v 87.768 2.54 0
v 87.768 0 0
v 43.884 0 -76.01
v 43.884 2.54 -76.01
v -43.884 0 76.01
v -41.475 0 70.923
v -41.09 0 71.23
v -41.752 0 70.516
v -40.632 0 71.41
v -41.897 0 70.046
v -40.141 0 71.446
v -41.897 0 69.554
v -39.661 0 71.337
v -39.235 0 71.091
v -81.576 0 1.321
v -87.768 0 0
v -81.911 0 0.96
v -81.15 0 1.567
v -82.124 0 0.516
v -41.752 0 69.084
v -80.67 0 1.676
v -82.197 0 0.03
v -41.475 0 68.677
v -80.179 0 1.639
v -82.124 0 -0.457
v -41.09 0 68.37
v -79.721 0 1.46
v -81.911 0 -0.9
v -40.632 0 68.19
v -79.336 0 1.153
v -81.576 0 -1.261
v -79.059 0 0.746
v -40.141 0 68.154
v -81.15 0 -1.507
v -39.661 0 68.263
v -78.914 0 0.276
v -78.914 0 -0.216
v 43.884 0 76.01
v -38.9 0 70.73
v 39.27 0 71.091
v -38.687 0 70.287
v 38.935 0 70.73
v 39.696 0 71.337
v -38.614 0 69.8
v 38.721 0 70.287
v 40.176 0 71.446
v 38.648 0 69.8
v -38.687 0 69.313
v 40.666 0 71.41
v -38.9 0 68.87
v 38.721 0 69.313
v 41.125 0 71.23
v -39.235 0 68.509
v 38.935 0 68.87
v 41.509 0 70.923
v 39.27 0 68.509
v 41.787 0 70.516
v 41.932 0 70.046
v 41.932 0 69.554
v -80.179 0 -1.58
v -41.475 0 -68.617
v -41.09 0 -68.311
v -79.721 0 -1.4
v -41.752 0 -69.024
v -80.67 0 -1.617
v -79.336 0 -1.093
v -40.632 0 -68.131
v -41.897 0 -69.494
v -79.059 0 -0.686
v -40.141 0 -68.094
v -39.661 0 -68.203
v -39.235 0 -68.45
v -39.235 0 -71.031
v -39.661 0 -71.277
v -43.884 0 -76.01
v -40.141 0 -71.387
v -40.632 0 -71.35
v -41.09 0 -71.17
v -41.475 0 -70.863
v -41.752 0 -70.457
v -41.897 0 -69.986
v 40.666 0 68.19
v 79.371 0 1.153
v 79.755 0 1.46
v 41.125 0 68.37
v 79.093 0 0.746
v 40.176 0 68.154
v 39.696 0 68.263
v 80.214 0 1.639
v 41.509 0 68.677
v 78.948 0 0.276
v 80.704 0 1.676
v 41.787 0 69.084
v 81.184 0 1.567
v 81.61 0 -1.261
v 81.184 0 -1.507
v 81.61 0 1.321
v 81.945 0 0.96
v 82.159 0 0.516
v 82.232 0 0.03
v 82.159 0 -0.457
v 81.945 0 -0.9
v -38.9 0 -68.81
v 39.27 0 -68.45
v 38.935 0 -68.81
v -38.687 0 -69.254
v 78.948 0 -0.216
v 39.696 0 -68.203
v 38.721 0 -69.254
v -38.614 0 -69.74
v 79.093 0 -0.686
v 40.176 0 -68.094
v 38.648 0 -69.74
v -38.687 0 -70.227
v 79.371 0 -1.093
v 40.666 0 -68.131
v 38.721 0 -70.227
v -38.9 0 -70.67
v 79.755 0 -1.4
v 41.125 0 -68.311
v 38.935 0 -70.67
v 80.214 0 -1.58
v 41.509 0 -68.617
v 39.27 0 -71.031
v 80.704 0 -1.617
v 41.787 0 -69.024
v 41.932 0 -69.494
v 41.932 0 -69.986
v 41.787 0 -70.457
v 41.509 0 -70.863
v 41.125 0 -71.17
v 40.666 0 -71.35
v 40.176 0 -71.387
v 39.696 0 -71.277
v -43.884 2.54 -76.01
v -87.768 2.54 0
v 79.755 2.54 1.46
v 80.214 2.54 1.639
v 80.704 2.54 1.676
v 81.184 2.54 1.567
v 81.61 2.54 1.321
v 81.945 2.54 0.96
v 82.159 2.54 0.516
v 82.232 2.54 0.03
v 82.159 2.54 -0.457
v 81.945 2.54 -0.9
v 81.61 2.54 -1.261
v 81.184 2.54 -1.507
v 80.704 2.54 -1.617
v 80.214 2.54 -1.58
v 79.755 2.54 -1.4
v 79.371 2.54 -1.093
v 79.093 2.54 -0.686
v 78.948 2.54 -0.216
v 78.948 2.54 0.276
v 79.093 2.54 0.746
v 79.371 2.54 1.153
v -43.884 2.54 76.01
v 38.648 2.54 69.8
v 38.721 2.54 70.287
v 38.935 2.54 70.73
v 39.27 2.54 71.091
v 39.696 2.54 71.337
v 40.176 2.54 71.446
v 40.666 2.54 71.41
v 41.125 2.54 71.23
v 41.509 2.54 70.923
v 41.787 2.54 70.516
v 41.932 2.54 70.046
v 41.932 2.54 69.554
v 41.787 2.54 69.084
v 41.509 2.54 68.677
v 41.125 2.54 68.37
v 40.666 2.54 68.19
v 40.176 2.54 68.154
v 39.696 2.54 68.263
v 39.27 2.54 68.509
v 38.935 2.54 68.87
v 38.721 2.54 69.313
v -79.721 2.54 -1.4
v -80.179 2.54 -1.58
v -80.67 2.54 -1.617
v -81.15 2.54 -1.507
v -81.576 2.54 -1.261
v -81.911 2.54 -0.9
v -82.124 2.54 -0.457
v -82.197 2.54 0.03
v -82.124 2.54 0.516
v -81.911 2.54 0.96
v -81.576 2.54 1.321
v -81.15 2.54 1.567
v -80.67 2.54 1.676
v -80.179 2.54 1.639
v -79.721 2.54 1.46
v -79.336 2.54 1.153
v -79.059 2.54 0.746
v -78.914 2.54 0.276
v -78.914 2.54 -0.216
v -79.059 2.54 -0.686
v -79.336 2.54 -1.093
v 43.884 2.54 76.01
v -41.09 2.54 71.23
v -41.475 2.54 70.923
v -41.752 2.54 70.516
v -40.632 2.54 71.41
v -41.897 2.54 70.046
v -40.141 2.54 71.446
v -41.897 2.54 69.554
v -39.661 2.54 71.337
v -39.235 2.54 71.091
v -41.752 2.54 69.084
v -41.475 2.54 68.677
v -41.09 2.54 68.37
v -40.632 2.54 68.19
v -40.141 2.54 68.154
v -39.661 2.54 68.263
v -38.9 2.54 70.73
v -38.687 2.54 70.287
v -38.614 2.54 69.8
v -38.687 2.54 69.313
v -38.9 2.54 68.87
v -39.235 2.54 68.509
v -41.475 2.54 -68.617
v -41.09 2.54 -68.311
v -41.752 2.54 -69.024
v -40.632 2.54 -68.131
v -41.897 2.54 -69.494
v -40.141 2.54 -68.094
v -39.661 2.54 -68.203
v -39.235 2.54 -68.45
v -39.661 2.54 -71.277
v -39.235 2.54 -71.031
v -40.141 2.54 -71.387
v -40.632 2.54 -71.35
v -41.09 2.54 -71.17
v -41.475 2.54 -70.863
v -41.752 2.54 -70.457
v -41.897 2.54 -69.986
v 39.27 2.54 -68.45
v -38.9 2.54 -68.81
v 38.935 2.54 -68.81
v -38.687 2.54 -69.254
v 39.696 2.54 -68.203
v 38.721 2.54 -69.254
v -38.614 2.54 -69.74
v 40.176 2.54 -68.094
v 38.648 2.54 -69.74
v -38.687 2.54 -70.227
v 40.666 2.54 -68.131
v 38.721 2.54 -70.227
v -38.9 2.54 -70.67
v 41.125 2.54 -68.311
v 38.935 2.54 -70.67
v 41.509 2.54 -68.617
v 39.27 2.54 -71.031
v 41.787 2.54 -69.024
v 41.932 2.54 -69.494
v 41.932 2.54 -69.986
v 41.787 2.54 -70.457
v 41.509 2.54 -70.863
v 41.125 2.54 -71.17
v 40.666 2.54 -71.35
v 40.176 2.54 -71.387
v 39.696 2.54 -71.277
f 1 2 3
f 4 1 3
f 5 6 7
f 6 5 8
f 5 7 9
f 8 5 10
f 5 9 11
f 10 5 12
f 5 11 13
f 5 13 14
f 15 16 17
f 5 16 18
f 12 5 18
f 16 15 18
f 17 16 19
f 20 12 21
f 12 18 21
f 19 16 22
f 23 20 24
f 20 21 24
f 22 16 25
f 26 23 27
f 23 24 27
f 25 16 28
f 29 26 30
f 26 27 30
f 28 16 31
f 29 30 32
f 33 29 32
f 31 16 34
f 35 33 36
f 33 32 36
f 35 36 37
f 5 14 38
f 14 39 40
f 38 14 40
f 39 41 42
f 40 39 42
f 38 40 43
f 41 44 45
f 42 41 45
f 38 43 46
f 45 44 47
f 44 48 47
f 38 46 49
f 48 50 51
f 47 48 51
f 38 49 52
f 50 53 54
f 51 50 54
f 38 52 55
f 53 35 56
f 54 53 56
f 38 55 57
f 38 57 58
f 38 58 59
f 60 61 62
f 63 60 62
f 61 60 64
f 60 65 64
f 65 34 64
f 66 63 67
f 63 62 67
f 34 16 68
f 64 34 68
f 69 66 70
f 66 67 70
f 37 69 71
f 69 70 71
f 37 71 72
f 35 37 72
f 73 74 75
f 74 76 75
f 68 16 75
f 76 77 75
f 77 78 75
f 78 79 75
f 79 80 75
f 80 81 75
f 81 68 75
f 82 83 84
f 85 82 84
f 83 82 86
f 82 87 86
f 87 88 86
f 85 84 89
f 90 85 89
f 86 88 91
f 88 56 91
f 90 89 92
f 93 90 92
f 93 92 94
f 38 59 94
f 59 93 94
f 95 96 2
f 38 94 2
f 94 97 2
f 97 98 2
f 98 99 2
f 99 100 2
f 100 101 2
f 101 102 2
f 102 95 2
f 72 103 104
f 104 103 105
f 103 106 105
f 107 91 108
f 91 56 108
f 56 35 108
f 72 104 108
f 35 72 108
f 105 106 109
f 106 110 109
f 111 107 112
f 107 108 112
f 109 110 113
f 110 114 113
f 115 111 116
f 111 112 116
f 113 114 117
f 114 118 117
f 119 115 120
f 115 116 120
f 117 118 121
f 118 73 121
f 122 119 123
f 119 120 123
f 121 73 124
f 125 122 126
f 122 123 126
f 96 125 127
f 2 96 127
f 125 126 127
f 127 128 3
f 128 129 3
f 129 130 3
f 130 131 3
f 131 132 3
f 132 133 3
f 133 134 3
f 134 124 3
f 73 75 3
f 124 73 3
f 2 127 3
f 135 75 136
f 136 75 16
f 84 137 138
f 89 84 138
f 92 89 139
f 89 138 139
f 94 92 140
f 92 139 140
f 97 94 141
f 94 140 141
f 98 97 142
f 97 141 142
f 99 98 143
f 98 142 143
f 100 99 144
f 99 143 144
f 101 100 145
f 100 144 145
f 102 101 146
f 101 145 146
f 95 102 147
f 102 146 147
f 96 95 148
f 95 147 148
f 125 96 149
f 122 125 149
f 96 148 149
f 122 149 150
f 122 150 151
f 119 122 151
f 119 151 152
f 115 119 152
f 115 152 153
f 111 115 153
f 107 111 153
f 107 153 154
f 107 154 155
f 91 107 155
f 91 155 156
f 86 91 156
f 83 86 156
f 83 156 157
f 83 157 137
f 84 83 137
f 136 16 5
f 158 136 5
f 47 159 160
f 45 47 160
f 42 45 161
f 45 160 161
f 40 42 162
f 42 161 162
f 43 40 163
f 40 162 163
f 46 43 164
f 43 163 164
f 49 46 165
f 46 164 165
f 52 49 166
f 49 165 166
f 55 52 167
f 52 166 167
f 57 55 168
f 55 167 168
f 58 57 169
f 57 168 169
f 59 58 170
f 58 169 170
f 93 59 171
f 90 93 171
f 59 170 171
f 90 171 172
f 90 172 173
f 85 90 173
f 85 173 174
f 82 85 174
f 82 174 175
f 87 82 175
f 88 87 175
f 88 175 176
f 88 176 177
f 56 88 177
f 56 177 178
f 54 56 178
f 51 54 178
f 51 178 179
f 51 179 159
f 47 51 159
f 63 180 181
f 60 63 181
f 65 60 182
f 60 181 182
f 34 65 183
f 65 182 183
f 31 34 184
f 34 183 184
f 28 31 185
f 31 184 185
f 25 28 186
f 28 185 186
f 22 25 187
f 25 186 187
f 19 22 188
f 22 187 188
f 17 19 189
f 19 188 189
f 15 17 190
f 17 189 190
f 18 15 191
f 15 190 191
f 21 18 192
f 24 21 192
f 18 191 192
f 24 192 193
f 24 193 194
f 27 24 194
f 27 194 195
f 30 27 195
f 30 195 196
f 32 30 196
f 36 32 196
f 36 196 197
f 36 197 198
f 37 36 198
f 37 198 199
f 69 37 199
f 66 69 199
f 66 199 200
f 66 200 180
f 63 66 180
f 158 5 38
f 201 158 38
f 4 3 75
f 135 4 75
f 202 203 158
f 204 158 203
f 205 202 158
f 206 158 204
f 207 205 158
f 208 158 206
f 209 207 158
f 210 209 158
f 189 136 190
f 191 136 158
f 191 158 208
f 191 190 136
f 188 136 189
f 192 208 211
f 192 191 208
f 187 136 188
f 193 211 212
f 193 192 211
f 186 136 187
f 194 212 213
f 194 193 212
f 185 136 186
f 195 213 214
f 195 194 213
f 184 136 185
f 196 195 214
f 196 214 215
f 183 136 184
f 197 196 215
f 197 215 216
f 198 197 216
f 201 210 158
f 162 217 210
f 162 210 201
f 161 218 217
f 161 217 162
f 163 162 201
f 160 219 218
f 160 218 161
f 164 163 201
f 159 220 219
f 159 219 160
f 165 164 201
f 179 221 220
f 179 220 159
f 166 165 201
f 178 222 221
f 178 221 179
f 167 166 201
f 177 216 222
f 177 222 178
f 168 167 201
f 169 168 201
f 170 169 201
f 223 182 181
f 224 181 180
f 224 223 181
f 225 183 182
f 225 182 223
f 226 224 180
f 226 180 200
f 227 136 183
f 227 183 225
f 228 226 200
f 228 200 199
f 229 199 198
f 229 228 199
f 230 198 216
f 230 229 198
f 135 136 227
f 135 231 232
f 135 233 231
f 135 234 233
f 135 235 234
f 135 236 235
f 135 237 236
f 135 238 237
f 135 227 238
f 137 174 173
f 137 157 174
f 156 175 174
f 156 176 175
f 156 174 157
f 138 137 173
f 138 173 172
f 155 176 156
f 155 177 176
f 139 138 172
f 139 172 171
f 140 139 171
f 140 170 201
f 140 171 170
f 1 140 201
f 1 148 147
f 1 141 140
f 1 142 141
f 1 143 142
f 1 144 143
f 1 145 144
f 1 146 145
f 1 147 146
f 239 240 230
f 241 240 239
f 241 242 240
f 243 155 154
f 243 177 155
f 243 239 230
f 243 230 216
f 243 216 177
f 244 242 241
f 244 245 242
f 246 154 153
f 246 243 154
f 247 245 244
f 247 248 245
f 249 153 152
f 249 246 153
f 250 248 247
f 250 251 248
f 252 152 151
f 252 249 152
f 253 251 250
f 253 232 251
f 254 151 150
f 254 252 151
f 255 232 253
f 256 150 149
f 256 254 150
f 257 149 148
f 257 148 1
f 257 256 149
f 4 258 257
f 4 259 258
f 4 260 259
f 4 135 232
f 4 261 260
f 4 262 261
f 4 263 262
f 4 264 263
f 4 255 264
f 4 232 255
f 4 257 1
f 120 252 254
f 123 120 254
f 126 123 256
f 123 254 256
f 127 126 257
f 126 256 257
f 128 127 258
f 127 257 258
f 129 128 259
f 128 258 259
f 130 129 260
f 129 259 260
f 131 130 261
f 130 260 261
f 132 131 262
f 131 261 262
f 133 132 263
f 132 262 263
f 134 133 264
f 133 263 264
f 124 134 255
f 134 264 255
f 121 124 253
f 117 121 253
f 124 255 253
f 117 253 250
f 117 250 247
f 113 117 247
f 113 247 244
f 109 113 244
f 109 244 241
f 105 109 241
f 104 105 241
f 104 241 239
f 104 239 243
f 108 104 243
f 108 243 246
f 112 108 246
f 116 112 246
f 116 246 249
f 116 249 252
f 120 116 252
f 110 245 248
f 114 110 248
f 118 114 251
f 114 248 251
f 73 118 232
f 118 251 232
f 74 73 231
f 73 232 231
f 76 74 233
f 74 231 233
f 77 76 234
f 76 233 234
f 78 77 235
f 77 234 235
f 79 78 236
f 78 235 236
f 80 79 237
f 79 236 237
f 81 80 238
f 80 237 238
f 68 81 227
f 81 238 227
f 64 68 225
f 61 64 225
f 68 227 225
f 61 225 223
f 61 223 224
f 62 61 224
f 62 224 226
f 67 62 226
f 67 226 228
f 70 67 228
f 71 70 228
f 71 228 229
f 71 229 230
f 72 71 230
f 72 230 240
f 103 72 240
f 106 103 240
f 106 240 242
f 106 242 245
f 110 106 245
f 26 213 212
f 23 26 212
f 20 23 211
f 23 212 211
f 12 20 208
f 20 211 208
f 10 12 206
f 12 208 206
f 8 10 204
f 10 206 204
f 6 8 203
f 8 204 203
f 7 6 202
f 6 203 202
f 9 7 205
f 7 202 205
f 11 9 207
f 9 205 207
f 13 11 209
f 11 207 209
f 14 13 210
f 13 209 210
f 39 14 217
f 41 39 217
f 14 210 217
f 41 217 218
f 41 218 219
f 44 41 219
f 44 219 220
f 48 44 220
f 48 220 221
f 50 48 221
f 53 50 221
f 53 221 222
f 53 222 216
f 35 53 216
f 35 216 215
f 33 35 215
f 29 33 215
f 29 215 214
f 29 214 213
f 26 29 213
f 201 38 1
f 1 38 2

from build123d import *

# Parameters (mm, degrees)
BOSS_EXTRUDE1_DEPTH = 2.54
SKETCH2_R           = 1.651
CUT_EXTRUDE1_DEPTH  = 3.54
CIRPATTERN1_COUNT   = 6


with BuildPart() as part:
    # Sketch1 → Boss-Extrude1 (new body)
    with BuildSketch(Plane(origin=(0, 0, 0), x_dir=(1, 0, 0), z_dir=(0, 1, 0))):
        Polygon((43.884105286, -76.0095), (87.768210572, 0), (43.884105286, 76.0095), (-43.884105286, 76.0095), (-87.768210572, 0), (-43.884105286, -76.0095), align=None)
    extrude(amount=BOSS_EXTRUDE1_DEPTH)

    # Sketch2 → Cut-Extrude1 (cut, through all)
    with BuildSketch(Plane(origin=(0, 2.54, 0), x_dir=(1, 0, 0), z_dir=(0, 1, 0))):
        with Locations((-40.264605286, 69.740342102)):
            Circle(SKETCH2_R)
    cut_extrude1 = extrude(amount=-CUT_EXTRUDE1_DEPTH, mode=Mode.SUBTRACT)

    # CirPattern1: Cut-Extrude1 ×6 about axis
    cirpattern1_axis = Axis((0.017235622, 0, 0.029852973), (0, 1, 0))
    for i in range(1, CIRPATTERN1_COUNT):
        add(cut_extrude1.rotate(cirpattern1_axis, i * 360 / CIRPATTERN1_COUNT), mode=Mode.SUBTRACT)


solid = part.part
